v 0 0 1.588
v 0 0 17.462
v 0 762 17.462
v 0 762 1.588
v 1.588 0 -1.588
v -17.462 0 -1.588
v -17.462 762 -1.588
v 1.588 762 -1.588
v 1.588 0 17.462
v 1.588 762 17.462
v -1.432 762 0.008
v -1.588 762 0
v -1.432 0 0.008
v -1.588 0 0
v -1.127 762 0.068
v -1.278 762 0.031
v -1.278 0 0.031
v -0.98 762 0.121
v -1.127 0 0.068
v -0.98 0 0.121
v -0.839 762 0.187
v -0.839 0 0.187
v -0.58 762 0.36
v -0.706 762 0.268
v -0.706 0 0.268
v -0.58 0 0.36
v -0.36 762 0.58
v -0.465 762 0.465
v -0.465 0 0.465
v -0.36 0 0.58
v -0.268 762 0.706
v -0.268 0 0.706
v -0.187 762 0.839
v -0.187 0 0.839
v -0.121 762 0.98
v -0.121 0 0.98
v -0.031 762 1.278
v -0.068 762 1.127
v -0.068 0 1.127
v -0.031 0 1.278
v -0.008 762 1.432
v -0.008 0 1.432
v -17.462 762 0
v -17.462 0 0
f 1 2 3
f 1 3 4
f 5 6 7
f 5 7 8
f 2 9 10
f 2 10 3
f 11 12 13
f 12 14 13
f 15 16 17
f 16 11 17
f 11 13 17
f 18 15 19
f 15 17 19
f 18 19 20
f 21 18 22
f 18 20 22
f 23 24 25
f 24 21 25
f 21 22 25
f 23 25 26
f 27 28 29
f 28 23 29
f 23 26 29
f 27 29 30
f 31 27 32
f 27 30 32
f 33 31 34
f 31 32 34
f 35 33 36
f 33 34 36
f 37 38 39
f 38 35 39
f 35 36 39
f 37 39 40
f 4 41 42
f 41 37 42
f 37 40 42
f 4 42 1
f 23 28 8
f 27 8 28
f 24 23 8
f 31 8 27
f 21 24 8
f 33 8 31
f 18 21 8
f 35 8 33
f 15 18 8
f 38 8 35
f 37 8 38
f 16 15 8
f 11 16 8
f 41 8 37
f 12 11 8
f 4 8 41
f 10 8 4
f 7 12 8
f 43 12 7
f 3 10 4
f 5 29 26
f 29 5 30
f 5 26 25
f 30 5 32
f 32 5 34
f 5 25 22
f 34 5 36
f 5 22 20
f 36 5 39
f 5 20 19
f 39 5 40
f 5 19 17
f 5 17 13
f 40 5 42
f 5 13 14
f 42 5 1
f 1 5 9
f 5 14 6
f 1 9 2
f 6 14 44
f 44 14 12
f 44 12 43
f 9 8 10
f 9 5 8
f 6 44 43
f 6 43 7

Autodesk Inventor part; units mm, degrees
ref_plane "YZ Plane" through (0, 0, 0) normal (1, 0, 0) x (0, 1, 0)
ref_plane "XZ Plane" through (0, 0, 0) normal (0, 1, 0) x (-1, 0, 0)
ref_plane "XY Plane" through (0, 0, 0) normal (0, 0, 1) x (1, 0, 0)
sketch "Sketch1" plane through (0, 0, 0) normal (0, 1, 0) x (-1, 0, 0)
  line L0 (0, 17.4625) -> (0, 1.5875)
  line L1 (1.5875, 0) -> (17.4625, 0)
  line L2 (17.4625, 0) -> (17.4625, -1.5875)
  line L3 (17.4625, -1.5875) -> (-1.5875, -1.5875)
  line L4 (-1.5875, -1.5875) -> (-1.5875, 17.4625)
  line L5 (-1.5875, 17.4625) -> (0, 17.4625)
  arc A0 (0, 1.5875) -> (1.5875, 0) centre (1.5875, 1.5875) ccw
  point P0 (0, 0)
  dimension "d0" = 1.5875
  dimension "d1" = 19.05
  dimension "d2" = 1.5875
extrude "Extrusion1" add sketch "Sketch1" along normal blind 762
properties part number "Long Wall Cross" material "Aluminum 6061"
